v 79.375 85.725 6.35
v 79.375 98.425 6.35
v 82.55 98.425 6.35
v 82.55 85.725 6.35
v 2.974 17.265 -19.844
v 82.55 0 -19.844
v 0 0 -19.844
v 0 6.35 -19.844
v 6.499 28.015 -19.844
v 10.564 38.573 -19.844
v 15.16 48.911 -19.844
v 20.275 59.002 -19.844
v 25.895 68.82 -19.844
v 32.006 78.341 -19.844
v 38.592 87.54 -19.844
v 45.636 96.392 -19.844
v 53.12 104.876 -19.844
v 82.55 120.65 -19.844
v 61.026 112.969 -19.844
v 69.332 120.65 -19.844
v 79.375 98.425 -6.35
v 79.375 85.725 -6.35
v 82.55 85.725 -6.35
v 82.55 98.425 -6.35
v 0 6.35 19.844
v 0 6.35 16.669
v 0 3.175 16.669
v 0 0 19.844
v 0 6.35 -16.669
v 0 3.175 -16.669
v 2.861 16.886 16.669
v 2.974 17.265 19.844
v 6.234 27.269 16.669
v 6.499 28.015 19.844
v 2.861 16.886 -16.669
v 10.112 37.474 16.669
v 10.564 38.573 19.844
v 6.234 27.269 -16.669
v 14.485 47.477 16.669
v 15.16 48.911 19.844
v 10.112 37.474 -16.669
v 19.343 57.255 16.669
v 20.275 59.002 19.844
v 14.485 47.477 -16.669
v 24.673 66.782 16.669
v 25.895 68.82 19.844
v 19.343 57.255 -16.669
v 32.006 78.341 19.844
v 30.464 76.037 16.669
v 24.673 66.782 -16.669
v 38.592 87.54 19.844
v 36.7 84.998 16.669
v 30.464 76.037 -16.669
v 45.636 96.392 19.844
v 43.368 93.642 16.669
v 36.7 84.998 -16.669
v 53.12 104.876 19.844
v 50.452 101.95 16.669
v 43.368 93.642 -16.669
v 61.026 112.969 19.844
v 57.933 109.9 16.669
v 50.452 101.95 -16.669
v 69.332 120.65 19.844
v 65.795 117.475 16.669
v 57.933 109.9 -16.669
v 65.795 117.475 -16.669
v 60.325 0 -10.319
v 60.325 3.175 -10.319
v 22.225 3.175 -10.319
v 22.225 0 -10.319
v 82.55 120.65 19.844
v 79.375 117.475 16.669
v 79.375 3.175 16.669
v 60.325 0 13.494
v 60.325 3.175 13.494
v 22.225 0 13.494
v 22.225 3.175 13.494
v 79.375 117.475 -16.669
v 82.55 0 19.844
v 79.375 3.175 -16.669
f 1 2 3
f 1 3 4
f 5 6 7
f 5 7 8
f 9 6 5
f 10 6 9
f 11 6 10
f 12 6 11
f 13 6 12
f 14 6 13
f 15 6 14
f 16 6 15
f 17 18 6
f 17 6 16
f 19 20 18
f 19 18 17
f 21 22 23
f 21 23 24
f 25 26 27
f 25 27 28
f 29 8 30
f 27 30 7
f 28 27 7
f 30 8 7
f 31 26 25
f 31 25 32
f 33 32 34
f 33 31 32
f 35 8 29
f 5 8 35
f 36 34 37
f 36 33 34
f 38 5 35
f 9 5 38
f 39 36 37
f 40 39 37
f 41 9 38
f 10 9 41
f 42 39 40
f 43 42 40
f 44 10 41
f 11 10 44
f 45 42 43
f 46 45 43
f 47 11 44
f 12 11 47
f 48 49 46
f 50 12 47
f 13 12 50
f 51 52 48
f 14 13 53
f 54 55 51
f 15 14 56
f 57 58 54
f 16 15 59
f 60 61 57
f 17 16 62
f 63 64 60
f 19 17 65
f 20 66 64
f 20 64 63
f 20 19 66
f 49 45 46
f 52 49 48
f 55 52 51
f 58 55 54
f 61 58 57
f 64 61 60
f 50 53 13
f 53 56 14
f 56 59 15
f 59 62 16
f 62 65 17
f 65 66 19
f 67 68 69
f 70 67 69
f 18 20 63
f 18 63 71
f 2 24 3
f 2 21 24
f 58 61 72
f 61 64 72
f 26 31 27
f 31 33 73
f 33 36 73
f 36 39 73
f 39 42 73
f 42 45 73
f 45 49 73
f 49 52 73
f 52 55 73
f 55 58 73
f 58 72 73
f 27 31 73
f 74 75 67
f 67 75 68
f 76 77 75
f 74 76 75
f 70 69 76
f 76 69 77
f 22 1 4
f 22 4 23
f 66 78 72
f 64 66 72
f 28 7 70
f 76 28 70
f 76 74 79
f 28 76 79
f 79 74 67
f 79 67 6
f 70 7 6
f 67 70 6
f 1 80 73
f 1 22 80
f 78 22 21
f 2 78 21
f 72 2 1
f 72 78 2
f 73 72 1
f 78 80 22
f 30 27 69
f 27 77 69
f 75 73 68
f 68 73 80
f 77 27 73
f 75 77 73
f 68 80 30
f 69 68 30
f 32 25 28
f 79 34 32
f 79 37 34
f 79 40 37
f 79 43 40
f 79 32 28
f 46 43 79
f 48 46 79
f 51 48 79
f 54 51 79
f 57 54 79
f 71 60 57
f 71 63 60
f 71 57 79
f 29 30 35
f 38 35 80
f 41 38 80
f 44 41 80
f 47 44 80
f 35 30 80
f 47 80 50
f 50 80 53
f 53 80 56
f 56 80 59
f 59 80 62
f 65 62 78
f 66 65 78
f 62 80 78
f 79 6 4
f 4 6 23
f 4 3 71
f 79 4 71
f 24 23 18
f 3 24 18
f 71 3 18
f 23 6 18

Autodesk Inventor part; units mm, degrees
ref_plane "YZ Plane" through (0, 0, 0) normal (1, 0, 0) x (0, 1, 0)
ref_plane "XZ Plane" through (0, 0, 0) normal (0, 1, 0) x (-1, 0, 0)
ref_plane "XY Plane" through (0, 0, 0) normal (0, 0, 1) x (1, 0, 0)
sketch "Sketch1" plane through (0, 0, 0) normal (0, 0, 1) x (1, 0, 0)
  line L0 (0, 0) -> (82.55, 0)
  line L1 (82.55, 0) -> (82.55, 123.825)
  line L2 (82.55, 123.825) -> (0, 123.825)
  line L3 (0, 123.825) -> (0, 0)
  arc A0 (73.025, 123.825) -> (0, 6.35) centre (216.4664, -46.7758) ccw
  point P0 (60.325, 123.825)
  dimension "d0" = 82.55
  dimension "d1" = 123.825
  dimension "d5" = 9.525
  dimension "d6" = 6.35
extrude "Extrusion1" add sketch "Sketch1" along normal mid plane 46.0375 contours L3 A0 L2 L1 L0
sketch "Sketch3" plane through (0, 0, 23.0187) normal (-1, 0, 0) x (0, 0, 1)
  line L0 (-39.6875, 117.475) -> (-6.35, 117.475)
  line L1 (-6.35, 117.475) -> (-6.35, 3.175)
  line L2 (-6.35, 3.175) -> (-39.6875, 3.175)
  line L3 (-39.6875, 3.175) -> (-39.6875, 117.475)
  line L4 (0, 6.35) -> (0, 123.825) projected
  line L5 (-46.0375, 123.825) -> (0, 123.825) projected
  point P0 (-23.0187, 0)
  dimension "d9" = 33.3375
  dimension "d10" = 114.3
  dimension "d11" = 6.35
  dimension "d12" = 6.35
extrude "Extrusion2" cut sketch "Sketch3" along normal mid plane 158.75
sketch "Sketch4" plane through (79.375, 0, 23.0187) normal (-1, 0, 0) x (0, 0, 1)
  line L0 (-39.6875, 117.475) -> (-6.35, 117.475) projected
  line L1 (-39.6875, 117.475) -> (-6.35, 117.475) projected
  line L2 (-23.0188, 117.475) -> (-23.0188, 92.075)
  line L3 (-29.3688, 98.425) -> (-16.6688, 98.425)
  line L4 (-16.6688, 98.425) -> (-16.6688, 85.725)
  line L5 (-16.6688, 85.725) -> (-29.3688, 85.725)
  line L6 (-29.3688, 85.725) -> (-29.3688, 98.425)
  line L7 (-29.3688, 98.425) -> (-16.6688, 85.725) construction
  line L8 (-16.6688, 98.425) -> (-29.3688, 85.725) construction
  point P0 (-23.0187, 0)
  dimension "d26" = 25.4
  dimension "d27" = 12.7
  dimension "d28" = 12.7
extrude "Extrusion3" cut sketch "Sketch4" against normal through all
sketch "Sketch5" plane through (0, 3.175, 16.6688) normal (0, 1, 0) x (1, 0, 0)
  line L0 (60.325, 26.9875) -> (22.225, 26.9875)
  line L1 (22.225, 26.9875) -> (22.225, 3.175)
  line L2 (22.225, 3.175) -> (60.325, 3.175)
  line L3 (60.325, 3.175) -> (60.325, 26.9875)
  line L4 (65.7954, 33.3375) -> (0, 33.3375) projected
  line L5 (0, 0) -> (65.7954, 0) projected
  line L6 (0, 0) -> (0, 33.3375) projected
  point P0 (0, 16.6688)
  dimension "d20" = 6.35
  dimension "d21" = 3.175
  dimension "d22" = 22.225
  dimension "d23" = 38.1
extrude "Extrusion4" cut sketch "Sketch5" against normal blind 63.5
sketch "Sketch6" plane through (73.025, 123.825, 23.0187) normal (0, 1, 0) x (1, 0, 0)
  line L0 (9.525, 46.0375) -> (9.525, 0) projected
  line L1 (-73.025, 0) -> (9.525, 0) projected
  line L2 (9.525, 46.0375) -> (-7.684, 46.0375)
  line L3 (-7.684, 46.0375) -> (-7.684, 0)
  line L4 (-7.684, 0) -> (9.525, 0)
  line L5 (9.525, 0) -> (9.525, 46.0375)
  point P0 (-73.025, 23.0187)
extrude "Extrusion5" cut sketch "Sketch6" against normal blind 3.175
sketch "Sketch7" plane through (0, 0, 23.0187) normal (0, 0, 1) x (1, 0, 0)
  line L0 (82.55, 120.65) -> (82.55, 0) projected
  line L1 (0, 0) -> (82.55, 0)
  line L2 (82.55, 0) -> (82.55, 120.65)
  line L3 (82.55, 120.65) -> (0, 120.65)
  line L4 (0, 120.65) -> (0, 0)
extrude "Extrusion6" cut sketch "Sketch7" against normal blind 3.175
sketch "Sketch8" plane through (0, 0, -23.0187) normal (0, 0, -1) x (-1, 0, 0)
  line L0 (0, 0) -> (0, 6.35) projected
  line L1 (-82.55, 120.65) -> (-82.55, 0) projected
  line L2 (0, 0) -> (-82.55, 0)
  line L3 (-82.55, 0) -> (-82.55, 120.65)
  line L4 (-82.55, 120.65) -> (0, 120.65)
  line L5 (0, 120.65) -> (0, 0)
extrude "Extrusion7" cut sketch "Sketch8" against normal blind 3.175
properties part number "Pi Chassis"
